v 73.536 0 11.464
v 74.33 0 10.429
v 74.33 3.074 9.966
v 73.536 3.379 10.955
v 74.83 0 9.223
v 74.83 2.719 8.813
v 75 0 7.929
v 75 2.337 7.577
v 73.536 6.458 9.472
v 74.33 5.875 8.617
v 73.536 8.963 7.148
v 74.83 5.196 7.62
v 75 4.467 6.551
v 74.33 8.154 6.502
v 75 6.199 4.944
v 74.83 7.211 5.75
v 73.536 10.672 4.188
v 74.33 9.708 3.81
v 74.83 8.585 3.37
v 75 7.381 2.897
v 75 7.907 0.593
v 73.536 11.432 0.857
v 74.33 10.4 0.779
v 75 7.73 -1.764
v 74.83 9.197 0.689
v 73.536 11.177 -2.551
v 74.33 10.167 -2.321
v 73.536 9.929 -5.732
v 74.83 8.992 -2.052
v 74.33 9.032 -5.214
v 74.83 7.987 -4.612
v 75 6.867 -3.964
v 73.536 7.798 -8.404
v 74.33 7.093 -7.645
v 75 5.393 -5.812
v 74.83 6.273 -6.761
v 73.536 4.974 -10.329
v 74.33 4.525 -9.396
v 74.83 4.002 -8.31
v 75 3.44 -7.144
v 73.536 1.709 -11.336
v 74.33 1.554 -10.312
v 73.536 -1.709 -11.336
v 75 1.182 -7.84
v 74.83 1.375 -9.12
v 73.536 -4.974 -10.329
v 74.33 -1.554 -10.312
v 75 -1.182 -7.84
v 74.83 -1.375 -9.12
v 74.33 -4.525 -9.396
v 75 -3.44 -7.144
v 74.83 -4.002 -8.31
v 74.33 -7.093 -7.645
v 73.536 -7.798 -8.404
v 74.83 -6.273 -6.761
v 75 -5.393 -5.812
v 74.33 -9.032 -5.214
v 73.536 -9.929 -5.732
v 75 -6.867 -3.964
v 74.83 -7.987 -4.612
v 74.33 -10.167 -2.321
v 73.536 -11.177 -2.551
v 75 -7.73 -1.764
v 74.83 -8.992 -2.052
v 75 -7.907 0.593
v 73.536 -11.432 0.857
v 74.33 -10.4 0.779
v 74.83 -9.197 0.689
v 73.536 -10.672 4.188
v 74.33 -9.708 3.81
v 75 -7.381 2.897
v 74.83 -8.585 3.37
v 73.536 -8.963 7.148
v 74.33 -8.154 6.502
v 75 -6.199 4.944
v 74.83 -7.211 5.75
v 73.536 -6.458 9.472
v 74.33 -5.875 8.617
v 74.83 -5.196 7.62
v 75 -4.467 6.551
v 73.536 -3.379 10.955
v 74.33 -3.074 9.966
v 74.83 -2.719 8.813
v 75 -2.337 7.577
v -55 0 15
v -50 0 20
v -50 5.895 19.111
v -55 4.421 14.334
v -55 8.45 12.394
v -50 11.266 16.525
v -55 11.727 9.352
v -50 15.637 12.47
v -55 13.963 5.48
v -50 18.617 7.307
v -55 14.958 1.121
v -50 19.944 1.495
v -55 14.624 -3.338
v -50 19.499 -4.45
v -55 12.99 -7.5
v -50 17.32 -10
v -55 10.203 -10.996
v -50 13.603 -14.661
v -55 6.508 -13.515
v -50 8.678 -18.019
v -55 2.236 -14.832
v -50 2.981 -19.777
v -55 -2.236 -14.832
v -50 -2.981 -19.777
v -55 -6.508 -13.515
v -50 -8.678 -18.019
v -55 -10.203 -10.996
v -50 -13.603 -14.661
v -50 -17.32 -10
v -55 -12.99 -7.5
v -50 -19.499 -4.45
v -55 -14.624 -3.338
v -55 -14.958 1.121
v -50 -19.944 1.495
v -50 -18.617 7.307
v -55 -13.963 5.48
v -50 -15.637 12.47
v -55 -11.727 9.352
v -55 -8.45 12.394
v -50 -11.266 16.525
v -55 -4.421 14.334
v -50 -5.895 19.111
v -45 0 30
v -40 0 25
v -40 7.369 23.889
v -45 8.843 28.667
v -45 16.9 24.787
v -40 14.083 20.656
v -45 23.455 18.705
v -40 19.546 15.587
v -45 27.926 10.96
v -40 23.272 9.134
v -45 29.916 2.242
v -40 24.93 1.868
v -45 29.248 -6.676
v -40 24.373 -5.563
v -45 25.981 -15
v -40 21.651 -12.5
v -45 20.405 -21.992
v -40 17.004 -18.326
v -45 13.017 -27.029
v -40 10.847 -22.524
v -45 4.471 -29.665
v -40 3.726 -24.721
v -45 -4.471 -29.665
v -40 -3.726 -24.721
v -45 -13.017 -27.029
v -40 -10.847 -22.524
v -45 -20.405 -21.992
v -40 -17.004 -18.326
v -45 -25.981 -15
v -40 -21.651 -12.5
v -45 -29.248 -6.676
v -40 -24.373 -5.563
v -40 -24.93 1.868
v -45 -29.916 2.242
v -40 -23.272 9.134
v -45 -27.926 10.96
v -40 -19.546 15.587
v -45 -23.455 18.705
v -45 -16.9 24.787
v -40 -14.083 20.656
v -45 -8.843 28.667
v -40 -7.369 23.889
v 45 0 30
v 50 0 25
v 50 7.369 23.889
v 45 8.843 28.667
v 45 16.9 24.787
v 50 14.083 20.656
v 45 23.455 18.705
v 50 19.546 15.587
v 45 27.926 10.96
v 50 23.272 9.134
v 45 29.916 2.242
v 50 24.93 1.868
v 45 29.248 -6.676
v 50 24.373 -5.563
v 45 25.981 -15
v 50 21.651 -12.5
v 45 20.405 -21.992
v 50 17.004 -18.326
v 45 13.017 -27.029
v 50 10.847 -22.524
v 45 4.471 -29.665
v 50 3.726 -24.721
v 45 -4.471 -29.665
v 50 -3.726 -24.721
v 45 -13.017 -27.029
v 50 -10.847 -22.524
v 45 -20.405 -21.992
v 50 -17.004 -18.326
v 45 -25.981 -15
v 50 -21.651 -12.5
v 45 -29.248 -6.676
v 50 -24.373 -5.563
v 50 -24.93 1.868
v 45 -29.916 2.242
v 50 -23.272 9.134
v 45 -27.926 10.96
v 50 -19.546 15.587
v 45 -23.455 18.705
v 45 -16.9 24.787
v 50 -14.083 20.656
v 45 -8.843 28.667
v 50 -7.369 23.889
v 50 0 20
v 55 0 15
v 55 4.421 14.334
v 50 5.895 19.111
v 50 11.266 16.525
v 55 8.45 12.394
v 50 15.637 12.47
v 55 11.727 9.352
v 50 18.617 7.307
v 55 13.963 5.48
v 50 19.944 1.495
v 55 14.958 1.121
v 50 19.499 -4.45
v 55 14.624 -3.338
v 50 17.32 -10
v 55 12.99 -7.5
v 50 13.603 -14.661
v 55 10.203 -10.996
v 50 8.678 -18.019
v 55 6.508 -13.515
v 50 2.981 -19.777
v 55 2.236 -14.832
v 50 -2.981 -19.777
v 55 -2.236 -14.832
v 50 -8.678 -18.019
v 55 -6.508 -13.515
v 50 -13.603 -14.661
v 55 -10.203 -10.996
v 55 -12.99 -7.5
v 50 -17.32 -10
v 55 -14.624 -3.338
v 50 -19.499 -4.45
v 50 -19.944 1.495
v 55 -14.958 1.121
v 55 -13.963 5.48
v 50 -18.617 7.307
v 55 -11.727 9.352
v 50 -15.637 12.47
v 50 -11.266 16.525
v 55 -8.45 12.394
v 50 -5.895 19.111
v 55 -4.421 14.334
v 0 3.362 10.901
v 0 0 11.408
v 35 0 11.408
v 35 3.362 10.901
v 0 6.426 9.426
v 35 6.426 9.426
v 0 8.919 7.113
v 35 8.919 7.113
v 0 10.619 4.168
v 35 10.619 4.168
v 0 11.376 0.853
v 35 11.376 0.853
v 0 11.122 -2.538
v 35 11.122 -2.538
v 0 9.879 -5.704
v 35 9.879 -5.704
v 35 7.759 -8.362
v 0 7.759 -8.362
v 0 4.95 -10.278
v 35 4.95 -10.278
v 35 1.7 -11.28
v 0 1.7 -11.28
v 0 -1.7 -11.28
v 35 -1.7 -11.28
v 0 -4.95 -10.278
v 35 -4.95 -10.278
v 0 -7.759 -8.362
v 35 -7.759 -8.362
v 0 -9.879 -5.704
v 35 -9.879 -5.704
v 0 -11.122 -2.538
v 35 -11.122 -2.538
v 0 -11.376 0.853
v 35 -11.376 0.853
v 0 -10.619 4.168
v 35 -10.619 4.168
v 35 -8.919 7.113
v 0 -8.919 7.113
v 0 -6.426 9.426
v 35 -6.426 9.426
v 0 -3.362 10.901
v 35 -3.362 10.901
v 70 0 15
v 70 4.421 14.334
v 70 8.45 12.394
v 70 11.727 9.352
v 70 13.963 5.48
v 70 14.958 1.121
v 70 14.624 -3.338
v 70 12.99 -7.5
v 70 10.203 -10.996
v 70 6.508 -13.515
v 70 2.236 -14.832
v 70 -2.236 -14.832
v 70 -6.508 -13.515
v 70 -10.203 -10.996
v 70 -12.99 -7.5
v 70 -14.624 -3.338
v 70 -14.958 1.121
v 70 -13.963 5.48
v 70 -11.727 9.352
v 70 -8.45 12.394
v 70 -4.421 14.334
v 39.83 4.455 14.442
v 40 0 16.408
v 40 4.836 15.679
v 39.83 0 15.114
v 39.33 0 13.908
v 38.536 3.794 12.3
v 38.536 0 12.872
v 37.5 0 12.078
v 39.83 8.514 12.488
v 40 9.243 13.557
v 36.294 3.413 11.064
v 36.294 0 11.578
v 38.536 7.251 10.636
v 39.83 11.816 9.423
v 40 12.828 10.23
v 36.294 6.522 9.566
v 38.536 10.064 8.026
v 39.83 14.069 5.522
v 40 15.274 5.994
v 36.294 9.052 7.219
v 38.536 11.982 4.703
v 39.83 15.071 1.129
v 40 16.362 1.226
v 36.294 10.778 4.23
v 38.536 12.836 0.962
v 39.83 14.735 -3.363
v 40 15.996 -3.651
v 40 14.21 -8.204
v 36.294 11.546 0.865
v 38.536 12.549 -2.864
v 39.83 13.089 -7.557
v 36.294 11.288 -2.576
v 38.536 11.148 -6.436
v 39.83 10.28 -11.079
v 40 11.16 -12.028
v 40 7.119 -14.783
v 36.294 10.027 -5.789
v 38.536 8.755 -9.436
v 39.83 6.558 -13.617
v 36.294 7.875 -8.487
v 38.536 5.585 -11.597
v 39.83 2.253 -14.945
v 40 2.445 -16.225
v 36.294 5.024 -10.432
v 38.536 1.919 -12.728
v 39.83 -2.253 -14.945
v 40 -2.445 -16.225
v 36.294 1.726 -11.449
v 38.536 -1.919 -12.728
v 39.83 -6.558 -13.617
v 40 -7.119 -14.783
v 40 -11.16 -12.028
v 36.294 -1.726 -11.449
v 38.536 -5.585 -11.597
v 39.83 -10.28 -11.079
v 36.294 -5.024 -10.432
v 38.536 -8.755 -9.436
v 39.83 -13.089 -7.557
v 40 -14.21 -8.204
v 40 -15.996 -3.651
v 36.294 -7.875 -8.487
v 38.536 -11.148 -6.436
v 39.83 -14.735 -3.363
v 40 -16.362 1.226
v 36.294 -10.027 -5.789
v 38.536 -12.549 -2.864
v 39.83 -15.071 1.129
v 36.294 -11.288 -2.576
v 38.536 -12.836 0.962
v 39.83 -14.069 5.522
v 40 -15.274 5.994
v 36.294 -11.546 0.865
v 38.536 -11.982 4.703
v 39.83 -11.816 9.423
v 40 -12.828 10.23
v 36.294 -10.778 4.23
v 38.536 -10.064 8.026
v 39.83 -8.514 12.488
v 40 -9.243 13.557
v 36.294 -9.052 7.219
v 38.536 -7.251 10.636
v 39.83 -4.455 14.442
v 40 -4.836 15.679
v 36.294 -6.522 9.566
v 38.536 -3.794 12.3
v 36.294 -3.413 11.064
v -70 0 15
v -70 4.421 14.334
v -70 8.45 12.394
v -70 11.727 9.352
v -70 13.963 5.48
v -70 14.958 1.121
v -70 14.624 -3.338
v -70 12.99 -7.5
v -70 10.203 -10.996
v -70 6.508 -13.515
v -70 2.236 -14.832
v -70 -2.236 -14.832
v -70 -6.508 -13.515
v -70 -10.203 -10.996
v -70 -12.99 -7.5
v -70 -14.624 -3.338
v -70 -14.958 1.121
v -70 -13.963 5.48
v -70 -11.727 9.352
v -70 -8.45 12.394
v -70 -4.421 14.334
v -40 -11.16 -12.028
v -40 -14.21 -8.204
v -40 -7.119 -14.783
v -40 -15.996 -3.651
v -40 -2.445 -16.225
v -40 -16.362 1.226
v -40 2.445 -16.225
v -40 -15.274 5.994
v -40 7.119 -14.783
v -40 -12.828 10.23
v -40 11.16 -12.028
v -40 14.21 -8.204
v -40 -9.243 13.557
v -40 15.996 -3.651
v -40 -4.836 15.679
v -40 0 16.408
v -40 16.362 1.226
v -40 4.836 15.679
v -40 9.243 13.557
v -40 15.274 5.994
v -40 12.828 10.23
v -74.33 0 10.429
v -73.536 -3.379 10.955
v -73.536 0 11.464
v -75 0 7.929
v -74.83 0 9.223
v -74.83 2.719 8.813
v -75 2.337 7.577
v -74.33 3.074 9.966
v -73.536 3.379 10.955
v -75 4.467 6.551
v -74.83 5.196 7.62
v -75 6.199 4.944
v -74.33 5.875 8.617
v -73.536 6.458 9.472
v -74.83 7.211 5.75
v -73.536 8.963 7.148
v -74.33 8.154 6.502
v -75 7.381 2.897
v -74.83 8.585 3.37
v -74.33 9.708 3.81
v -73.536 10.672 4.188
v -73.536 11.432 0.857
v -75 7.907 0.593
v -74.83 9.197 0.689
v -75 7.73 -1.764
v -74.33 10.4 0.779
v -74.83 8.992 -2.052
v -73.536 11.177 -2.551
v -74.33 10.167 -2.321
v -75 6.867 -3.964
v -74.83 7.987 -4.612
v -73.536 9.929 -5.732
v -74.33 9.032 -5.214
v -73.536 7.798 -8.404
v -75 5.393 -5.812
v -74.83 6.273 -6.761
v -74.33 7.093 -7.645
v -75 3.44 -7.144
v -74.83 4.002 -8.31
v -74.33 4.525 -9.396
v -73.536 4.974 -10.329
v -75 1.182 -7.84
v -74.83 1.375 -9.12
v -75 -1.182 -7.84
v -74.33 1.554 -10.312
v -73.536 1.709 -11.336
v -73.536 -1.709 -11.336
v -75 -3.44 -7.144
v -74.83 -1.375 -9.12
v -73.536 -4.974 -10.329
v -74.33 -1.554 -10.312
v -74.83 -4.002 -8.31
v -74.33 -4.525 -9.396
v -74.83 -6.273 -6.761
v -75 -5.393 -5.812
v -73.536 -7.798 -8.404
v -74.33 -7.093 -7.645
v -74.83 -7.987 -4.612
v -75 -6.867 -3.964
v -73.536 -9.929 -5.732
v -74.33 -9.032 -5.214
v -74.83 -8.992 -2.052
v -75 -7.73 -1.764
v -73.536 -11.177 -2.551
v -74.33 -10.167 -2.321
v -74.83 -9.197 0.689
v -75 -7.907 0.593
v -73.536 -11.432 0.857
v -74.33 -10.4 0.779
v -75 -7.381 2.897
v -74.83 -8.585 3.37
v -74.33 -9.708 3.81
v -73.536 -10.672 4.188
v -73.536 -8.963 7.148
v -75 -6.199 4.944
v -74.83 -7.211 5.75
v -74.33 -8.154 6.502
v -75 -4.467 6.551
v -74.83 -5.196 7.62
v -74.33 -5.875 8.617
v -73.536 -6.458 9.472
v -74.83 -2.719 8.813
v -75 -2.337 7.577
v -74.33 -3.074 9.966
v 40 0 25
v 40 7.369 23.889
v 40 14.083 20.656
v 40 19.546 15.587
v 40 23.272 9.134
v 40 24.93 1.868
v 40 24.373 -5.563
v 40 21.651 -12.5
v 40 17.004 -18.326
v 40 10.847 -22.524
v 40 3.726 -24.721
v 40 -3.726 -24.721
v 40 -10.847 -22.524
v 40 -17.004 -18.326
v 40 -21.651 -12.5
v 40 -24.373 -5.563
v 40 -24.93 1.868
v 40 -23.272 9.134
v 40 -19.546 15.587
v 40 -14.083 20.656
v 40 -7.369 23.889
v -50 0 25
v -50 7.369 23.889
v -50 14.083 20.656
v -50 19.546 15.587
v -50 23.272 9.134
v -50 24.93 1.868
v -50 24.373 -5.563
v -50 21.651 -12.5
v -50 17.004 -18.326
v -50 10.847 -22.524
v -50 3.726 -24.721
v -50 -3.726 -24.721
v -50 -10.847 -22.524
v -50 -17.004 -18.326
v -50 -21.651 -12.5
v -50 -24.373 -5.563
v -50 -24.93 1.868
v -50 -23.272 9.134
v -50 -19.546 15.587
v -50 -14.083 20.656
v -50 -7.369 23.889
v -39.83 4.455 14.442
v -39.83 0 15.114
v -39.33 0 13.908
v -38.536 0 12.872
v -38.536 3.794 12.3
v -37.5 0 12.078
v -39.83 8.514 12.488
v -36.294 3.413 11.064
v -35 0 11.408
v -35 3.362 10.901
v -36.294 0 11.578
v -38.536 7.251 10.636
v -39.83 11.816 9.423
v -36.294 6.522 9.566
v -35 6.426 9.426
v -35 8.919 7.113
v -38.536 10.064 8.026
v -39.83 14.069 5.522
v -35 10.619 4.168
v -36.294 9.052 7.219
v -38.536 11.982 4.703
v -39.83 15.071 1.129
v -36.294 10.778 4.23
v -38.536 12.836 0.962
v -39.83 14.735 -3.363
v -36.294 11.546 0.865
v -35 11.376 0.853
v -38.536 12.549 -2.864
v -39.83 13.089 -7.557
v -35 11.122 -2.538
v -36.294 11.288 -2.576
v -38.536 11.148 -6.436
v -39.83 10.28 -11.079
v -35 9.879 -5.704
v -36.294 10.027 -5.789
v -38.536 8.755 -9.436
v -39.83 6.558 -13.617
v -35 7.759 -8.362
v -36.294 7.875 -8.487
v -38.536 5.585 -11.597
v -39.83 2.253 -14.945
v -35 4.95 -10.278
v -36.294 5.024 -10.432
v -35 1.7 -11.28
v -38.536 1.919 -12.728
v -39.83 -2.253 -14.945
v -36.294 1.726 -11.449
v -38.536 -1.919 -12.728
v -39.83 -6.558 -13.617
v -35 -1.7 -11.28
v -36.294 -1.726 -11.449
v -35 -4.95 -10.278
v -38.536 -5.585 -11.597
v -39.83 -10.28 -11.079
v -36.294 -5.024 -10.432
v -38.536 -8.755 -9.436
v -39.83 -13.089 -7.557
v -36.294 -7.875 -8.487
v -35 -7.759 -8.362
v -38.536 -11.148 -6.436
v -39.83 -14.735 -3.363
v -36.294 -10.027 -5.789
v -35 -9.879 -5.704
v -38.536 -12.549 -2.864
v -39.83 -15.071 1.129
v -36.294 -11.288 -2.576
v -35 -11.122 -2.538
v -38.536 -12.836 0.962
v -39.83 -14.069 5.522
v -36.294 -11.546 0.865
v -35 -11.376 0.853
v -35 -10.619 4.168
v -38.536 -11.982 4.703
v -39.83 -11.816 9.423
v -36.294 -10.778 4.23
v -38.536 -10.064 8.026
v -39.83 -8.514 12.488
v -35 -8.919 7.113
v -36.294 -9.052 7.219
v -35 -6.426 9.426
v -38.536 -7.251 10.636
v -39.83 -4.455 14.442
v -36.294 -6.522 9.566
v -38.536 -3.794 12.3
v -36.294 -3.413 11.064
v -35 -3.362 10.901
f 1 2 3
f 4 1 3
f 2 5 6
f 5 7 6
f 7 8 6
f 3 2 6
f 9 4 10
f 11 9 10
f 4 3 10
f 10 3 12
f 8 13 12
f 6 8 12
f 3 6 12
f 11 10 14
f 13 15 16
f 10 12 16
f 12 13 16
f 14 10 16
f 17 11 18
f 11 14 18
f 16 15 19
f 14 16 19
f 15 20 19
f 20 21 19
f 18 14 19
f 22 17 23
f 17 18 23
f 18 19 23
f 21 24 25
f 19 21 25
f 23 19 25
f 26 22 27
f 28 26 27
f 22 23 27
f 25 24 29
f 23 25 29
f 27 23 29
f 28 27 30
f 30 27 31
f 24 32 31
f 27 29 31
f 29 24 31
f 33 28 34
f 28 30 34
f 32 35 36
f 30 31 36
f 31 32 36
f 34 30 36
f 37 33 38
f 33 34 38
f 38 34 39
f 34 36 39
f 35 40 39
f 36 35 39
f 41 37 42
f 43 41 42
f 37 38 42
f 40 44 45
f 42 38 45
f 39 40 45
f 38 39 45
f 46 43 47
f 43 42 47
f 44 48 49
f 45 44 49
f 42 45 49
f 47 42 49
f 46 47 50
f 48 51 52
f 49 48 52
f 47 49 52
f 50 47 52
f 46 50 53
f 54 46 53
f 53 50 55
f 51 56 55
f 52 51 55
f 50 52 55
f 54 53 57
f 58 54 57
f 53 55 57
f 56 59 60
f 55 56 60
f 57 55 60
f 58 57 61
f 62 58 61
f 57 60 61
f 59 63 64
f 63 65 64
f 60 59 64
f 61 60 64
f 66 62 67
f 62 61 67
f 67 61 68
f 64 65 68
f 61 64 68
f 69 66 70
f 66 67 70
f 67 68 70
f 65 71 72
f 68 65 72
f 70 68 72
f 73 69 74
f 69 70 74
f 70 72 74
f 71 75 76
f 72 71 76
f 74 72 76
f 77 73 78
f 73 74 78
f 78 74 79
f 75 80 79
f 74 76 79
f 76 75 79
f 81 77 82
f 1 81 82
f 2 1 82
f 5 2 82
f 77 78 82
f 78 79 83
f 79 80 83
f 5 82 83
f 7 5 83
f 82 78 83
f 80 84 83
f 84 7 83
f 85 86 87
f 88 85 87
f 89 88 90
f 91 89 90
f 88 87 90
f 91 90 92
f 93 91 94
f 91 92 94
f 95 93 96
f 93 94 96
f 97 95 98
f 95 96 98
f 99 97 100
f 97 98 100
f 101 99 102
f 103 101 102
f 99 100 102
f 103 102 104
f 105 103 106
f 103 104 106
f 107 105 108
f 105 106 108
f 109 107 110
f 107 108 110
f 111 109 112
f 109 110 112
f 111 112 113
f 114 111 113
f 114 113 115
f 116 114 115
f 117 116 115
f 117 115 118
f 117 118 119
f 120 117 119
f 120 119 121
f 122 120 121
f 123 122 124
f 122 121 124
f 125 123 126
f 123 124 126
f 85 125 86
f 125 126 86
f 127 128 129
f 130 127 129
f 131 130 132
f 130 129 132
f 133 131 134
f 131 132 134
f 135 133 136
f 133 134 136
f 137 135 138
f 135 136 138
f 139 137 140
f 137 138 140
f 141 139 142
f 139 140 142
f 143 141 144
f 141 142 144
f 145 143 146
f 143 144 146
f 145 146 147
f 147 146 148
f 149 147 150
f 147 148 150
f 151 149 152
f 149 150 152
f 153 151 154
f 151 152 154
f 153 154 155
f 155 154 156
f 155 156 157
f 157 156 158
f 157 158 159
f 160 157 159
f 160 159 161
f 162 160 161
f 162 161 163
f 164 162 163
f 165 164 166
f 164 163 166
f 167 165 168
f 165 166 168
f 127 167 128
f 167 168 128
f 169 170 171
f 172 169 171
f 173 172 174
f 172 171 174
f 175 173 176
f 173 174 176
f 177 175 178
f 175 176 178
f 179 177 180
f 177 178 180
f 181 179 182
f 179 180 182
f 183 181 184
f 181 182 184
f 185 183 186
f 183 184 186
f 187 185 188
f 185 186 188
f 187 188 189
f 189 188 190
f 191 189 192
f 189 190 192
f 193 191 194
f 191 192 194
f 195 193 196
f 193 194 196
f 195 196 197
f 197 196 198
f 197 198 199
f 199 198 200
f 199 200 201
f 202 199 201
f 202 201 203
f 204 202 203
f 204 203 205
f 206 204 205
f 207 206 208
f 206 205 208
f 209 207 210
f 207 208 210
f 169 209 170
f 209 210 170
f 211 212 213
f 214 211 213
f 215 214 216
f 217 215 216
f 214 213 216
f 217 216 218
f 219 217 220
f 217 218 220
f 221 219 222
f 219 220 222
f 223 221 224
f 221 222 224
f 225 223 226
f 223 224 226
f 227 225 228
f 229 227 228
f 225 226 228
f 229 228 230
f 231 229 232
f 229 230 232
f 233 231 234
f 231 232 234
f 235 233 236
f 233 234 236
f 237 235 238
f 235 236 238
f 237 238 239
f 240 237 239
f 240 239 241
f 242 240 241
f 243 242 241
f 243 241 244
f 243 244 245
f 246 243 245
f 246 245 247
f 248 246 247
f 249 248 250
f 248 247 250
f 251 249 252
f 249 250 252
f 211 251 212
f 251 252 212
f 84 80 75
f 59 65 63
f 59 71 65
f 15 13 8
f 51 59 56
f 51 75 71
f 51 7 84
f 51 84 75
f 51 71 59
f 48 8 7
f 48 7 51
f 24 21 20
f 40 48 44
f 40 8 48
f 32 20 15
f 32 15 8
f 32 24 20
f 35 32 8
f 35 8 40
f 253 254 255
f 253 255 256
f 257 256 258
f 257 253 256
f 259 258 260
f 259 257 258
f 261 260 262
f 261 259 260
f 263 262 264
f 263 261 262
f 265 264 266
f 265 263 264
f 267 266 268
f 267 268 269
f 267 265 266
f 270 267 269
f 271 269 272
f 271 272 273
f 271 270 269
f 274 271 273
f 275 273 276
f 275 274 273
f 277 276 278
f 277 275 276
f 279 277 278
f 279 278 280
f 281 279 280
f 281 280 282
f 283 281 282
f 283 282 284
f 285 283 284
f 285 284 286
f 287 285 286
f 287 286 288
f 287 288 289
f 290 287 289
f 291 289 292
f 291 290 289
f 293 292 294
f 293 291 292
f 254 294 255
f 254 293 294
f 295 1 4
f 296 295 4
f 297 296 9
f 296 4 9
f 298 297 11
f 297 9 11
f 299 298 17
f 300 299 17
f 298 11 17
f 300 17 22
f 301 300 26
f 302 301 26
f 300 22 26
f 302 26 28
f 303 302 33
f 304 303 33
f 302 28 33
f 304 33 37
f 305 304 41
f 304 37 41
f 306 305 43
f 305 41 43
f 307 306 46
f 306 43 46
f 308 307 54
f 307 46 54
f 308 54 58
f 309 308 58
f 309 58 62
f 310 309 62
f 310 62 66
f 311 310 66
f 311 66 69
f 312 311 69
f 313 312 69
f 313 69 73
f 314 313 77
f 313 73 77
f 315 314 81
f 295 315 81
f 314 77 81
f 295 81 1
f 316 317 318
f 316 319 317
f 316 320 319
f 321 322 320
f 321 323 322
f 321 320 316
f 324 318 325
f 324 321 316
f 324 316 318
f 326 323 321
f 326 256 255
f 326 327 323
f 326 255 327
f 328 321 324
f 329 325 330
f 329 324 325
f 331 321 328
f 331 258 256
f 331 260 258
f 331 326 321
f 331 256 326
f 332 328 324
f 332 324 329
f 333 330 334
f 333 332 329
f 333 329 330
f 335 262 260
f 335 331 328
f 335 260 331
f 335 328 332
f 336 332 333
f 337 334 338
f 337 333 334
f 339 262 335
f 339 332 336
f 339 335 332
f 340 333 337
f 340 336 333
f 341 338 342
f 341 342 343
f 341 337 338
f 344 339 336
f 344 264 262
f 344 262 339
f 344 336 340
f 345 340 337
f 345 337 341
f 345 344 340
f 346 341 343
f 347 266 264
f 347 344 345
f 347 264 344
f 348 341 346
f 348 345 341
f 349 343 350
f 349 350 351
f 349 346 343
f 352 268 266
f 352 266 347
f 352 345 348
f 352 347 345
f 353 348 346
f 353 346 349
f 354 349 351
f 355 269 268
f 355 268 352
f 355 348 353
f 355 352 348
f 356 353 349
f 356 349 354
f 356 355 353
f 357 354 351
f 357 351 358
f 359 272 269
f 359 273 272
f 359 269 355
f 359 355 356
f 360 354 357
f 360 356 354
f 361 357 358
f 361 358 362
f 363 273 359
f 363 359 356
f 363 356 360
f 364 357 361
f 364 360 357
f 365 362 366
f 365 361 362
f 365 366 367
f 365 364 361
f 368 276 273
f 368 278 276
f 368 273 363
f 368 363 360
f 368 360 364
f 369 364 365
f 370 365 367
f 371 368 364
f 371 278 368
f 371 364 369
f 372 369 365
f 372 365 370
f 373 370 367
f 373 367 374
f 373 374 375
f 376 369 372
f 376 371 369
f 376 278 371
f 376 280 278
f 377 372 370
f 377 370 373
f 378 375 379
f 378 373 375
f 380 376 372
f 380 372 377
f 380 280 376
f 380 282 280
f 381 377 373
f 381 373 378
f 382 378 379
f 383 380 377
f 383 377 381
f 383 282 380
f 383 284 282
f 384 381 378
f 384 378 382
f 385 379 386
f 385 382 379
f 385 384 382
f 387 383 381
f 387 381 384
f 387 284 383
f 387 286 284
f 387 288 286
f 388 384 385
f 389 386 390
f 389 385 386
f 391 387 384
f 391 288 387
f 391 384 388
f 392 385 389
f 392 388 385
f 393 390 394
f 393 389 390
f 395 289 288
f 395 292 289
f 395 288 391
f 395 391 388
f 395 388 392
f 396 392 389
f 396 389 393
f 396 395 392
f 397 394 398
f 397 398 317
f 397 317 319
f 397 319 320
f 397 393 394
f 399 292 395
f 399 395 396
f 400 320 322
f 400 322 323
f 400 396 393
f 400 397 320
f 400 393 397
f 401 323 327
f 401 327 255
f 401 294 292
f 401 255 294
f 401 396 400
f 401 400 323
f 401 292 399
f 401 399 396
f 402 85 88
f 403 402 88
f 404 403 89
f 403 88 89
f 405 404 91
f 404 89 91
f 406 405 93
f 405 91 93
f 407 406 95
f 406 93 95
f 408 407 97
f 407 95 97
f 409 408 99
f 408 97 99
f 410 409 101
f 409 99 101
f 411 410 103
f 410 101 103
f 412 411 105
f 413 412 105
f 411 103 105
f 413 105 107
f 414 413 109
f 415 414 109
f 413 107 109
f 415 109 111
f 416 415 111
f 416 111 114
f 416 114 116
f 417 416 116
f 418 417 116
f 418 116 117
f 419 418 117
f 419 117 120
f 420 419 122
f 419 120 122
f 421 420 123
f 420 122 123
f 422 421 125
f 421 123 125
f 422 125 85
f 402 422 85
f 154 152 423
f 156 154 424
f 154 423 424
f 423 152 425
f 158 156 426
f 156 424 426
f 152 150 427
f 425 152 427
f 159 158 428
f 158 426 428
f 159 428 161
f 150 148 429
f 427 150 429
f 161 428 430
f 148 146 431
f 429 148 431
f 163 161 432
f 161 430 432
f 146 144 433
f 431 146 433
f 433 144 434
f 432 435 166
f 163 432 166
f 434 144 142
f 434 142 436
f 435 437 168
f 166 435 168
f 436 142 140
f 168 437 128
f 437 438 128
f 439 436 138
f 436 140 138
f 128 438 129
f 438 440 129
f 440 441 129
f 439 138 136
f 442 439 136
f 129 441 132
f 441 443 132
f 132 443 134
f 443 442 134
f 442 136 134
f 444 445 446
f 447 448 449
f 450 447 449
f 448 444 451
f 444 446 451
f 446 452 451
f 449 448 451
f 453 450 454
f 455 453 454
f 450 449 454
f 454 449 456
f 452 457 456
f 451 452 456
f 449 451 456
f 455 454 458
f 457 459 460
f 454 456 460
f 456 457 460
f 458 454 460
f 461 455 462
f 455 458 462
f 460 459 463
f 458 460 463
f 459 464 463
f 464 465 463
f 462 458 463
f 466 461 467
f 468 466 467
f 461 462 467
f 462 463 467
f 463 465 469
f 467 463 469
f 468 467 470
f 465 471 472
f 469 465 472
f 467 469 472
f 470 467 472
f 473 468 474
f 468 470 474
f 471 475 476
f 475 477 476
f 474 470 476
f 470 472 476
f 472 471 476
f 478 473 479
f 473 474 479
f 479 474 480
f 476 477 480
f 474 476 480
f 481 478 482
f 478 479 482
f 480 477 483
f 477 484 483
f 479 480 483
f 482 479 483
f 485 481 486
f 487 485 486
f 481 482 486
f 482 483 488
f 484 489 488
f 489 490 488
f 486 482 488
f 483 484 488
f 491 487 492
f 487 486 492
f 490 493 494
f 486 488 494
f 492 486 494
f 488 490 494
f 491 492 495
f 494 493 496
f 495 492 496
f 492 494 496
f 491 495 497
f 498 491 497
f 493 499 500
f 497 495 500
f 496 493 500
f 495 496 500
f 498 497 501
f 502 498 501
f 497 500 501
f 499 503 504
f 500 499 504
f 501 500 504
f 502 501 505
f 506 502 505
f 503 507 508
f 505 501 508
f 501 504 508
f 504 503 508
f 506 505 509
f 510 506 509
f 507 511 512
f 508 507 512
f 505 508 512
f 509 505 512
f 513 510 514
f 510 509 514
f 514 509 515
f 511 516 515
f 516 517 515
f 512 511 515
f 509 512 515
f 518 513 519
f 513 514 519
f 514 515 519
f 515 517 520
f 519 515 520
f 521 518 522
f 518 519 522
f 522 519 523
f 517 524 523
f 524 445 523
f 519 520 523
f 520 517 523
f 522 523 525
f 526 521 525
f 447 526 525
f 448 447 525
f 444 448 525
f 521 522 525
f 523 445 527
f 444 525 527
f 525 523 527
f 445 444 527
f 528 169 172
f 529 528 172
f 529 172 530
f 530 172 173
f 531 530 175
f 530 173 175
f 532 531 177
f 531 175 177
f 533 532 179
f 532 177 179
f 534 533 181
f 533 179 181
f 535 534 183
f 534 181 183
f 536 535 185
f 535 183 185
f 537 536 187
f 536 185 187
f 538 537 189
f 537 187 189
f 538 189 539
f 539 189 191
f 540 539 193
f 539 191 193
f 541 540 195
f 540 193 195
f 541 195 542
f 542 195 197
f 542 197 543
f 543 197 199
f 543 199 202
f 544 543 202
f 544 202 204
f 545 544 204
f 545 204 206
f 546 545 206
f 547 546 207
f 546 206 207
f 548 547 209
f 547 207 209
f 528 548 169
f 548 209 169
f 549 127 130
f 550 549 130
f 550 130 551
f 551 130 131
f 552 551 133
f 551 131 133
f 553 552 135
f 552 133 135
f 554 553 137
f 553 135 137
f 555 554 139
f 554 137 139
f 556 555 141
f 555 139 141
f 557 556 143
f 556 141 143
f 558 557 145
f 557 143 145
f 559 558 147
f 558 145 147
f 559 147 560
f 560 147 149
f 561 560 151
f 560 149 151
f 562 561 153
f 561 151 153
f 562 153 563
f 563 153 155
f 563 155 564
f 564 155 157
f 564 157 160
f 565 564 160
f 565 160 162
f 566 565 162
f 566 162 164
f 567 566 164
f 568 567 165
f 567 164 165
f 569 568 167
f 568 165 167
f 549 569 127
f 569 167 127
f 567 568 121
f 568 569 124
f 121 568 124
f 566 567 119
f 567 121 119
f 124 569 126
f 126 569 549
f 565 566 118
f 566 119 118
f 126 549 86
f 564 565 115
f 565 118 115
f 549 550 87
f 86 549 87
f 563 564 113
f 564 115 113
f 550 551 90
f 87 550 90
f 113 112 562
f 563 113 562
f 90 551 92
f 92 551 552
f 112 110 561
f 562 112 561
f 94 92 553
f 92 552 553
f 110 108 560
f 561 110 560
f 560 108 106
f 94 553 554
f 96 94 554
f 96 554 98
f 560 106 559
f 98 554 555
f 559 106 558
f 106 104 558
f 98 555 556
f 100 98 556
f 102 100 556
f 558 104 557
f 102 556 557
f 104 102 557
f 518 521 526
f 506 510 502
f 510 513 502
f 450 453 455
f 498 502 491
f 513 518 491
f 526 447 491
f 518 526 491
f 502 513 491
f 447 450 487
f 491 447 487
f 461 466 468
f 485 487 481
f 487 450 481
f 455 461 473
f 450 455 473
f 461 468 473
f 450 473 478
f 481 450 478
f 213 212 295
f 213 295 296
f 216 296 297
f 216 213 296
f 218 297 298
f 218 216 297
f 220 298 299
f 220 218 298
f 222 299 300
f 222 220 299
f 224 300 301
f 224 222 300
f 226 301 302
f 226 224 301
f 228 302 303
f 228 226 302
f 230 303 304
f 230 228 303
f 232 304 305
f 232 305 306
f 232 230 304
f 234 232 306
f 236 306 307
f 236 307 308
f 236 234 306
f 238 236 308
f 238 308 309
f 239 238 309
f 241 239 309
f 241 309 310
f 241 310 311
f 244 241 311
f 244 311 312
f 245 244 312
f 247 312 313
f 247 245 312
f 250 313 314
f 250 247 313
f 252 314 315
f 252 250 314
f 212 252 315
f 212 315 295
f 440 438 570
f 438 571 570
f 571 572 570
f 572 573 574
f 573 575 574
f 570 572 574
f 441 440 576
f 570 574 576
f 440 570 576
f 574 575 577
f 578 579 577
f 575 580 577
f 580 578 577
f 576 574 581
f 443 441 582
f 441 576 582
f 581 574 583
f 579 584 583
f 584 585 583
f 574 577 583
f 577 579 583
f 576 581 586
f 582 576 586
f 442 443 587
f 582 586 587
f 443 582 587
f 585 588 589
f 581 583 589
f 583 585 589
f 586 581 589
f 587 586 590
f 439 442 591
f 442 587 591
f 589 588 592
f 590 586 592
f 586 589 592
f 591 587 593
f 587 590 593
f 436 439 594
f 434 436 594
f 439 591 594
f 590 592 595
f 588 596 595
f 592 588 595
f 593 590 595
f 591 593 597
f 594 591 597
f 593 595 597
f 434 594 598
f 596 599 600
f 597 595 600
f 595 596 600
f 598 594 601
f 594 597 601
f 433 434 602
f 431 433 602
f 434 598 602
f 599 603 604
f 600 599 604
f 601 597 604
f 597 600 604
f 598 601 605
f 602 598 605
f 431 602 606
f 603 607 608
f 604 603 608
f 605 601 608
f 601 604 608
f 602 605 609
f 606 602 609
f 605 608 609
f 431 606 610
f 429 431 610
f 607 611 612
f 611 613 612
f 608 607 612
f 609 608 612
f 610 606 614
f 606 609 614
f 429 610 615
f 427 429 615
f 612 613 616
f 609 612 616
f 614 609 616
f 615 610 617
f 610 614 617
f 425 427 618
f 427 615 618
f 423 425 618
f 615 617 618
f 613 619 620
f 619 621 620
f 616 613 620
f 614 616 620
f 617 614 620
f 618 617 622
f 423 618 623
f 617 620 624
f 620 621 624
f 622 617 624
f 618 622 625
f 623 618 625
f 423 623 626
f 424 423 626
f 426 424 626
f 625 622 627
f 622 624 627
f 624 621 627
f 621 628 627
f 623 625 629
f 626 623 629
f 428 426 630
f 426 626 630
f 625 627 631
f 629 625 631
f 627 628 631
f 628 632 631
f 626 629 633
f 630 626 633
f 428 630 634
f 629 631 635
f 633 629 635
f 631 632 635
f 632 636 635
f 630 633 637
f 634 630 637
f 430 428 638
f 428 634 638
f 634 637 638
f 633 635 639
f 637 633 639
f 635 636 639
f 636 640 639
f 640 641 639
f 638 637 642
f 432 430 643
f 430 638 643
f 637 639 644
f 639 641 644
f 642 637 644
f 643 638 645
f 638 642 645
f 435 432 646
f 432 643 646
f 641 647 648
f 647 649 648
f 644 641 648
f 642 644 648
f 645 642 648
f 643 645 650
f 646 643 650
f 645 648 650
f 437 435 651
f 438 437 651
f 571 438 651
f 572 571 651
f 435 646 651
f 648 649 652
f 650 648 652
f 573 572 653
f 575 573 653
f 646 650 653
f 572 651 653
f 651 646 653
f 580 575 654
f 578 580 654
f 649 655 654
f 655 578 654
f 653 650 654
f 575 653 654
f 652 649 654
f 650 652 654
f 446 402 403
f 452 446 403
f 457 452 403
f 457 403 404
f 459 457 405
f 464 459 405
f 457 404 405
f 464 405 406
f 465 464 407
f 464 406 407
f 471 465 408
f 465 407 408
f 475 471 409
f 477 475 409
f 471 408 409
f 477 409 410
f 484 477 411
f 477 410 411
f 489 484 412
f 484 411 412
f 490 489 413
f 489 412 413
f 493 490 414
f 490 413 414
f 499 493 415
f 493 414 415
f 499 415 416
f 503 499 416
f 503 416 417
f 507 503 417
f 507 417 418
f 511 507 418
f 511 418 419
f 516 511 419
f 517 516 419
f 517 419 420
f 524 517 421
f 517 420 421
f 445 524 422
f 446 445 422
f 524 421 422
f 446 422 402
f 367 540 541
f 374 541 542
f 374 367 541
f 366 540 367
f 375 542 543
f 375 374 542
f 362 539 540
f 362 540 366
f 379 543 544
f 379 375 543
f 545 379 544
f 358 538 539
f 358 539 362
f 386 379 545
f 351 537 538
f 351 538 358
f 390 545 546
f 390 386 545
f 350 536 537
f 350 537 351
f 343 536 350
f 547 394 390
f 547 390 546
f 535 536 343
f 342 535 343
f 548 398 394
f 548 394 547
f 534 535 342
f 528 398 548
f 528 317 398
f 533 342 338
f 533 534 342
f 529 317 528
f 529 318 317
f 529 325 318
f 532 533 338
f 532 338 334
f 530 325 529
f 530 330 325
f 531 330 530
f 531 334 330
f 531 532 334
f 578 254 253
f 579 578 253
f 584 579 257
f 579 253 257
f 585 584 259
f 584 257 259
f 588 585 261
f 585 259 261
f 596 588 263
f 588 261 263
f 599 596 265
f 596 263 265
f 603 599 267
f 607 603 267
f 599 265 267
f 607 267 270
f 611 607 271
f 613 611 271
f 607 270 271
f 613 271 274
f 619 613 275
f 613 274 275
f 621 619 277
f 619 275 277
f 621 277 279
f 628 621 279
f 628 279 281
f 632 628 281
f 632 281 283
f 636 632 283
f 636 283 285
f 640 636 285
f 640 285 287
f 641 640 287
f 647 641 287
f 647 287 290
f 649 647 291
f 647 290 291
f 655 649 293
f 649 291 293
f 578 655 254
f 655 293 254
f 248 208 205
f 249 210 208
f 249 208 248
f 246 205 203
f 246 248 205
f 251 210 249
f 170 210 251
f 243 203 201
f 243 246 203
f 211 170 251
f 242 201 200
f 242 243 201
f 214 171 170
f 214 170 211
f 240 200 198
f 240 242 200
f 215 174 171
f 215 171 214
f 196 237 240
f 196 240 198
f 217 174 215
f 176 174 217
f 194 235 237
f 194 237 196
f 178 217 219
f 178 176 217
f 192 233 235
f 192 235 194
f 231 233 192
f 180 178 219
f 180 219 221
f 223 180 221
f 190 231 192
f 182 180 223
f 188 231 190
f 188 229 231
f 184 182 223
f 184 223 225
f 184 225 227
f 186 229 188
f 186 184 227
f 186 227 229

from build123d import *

# Parameters (mm, degrees)
F3_SIZE = 4.99999
F4_R    = 5


# Not quite as in the source:
# - a fillet or chamfer is up to 0.001 mm smaller than in the source, because OpenCascade refuses the exact size


with BuildPart() as f1:
    # F0 (on Front) → F1 (revolve)
    with BuildSketch(Plane.XZ):
        with BuildLine():
            Line((0, 11.4077670069), (0, 0))
            Line((0, 0), (75, 0))
            Line((75, 0), (75, 15))
            Line((75, 15), (50, 15))
            Line((50, 15), (50, 30))
            Line((50, 30), (40, 30))
            Line((40, 30), (40, 16.4077670069))
            ThreePointArc((40, 16.4077670069), (38.5355339059, 12.872233101), (35, 11.4077670069))
            Line((35, 11.4077670069), (0, 11.4077670069))
        make_face()
    revolve(axis=Axis((37.5, 0, 0), (-1, 0, 0)))

    # F2: F1 across face


with BuildPart() as f1_1:
    add(f1.part)
    add(f1.part.mirror(Plane(origin=(0, 0, 0), x_dir=(0, -1, 0), z_dir=(-1, 0, 0))))

    # F3 (size 5 in the source; OpenCascade refuses exactly that, so slightly less here)
    f3_edges = [f1_1.edges().sort_by_distance(p)[0] for p in [
        (-40, 0, -30),
        (-75, 0, -15),
        (-50, 0, -30),
        (40, 0, -30),
        (40, 0, -16.407767),
        (-35, 0, -11.407767),
        (35, 0, -11.407767),
        (75, 0, -15),
        (50, 0, -30),
        (-40, 0, -16.407767),
        (-50, 0, -15),
        (50, 0, -15),
    ]]
    chamfer(f3_edges, length=F3_SIZE)

    # F4
    f4_edges = [f1_1.edges().sort_by_distance(p)[0] for p in [
        (-75, 0, -10.00001),
        (75, 0, -10.00001),
    ]]
    fillet(f4_edges, radius=F4_R)


solid = f1_1.part
